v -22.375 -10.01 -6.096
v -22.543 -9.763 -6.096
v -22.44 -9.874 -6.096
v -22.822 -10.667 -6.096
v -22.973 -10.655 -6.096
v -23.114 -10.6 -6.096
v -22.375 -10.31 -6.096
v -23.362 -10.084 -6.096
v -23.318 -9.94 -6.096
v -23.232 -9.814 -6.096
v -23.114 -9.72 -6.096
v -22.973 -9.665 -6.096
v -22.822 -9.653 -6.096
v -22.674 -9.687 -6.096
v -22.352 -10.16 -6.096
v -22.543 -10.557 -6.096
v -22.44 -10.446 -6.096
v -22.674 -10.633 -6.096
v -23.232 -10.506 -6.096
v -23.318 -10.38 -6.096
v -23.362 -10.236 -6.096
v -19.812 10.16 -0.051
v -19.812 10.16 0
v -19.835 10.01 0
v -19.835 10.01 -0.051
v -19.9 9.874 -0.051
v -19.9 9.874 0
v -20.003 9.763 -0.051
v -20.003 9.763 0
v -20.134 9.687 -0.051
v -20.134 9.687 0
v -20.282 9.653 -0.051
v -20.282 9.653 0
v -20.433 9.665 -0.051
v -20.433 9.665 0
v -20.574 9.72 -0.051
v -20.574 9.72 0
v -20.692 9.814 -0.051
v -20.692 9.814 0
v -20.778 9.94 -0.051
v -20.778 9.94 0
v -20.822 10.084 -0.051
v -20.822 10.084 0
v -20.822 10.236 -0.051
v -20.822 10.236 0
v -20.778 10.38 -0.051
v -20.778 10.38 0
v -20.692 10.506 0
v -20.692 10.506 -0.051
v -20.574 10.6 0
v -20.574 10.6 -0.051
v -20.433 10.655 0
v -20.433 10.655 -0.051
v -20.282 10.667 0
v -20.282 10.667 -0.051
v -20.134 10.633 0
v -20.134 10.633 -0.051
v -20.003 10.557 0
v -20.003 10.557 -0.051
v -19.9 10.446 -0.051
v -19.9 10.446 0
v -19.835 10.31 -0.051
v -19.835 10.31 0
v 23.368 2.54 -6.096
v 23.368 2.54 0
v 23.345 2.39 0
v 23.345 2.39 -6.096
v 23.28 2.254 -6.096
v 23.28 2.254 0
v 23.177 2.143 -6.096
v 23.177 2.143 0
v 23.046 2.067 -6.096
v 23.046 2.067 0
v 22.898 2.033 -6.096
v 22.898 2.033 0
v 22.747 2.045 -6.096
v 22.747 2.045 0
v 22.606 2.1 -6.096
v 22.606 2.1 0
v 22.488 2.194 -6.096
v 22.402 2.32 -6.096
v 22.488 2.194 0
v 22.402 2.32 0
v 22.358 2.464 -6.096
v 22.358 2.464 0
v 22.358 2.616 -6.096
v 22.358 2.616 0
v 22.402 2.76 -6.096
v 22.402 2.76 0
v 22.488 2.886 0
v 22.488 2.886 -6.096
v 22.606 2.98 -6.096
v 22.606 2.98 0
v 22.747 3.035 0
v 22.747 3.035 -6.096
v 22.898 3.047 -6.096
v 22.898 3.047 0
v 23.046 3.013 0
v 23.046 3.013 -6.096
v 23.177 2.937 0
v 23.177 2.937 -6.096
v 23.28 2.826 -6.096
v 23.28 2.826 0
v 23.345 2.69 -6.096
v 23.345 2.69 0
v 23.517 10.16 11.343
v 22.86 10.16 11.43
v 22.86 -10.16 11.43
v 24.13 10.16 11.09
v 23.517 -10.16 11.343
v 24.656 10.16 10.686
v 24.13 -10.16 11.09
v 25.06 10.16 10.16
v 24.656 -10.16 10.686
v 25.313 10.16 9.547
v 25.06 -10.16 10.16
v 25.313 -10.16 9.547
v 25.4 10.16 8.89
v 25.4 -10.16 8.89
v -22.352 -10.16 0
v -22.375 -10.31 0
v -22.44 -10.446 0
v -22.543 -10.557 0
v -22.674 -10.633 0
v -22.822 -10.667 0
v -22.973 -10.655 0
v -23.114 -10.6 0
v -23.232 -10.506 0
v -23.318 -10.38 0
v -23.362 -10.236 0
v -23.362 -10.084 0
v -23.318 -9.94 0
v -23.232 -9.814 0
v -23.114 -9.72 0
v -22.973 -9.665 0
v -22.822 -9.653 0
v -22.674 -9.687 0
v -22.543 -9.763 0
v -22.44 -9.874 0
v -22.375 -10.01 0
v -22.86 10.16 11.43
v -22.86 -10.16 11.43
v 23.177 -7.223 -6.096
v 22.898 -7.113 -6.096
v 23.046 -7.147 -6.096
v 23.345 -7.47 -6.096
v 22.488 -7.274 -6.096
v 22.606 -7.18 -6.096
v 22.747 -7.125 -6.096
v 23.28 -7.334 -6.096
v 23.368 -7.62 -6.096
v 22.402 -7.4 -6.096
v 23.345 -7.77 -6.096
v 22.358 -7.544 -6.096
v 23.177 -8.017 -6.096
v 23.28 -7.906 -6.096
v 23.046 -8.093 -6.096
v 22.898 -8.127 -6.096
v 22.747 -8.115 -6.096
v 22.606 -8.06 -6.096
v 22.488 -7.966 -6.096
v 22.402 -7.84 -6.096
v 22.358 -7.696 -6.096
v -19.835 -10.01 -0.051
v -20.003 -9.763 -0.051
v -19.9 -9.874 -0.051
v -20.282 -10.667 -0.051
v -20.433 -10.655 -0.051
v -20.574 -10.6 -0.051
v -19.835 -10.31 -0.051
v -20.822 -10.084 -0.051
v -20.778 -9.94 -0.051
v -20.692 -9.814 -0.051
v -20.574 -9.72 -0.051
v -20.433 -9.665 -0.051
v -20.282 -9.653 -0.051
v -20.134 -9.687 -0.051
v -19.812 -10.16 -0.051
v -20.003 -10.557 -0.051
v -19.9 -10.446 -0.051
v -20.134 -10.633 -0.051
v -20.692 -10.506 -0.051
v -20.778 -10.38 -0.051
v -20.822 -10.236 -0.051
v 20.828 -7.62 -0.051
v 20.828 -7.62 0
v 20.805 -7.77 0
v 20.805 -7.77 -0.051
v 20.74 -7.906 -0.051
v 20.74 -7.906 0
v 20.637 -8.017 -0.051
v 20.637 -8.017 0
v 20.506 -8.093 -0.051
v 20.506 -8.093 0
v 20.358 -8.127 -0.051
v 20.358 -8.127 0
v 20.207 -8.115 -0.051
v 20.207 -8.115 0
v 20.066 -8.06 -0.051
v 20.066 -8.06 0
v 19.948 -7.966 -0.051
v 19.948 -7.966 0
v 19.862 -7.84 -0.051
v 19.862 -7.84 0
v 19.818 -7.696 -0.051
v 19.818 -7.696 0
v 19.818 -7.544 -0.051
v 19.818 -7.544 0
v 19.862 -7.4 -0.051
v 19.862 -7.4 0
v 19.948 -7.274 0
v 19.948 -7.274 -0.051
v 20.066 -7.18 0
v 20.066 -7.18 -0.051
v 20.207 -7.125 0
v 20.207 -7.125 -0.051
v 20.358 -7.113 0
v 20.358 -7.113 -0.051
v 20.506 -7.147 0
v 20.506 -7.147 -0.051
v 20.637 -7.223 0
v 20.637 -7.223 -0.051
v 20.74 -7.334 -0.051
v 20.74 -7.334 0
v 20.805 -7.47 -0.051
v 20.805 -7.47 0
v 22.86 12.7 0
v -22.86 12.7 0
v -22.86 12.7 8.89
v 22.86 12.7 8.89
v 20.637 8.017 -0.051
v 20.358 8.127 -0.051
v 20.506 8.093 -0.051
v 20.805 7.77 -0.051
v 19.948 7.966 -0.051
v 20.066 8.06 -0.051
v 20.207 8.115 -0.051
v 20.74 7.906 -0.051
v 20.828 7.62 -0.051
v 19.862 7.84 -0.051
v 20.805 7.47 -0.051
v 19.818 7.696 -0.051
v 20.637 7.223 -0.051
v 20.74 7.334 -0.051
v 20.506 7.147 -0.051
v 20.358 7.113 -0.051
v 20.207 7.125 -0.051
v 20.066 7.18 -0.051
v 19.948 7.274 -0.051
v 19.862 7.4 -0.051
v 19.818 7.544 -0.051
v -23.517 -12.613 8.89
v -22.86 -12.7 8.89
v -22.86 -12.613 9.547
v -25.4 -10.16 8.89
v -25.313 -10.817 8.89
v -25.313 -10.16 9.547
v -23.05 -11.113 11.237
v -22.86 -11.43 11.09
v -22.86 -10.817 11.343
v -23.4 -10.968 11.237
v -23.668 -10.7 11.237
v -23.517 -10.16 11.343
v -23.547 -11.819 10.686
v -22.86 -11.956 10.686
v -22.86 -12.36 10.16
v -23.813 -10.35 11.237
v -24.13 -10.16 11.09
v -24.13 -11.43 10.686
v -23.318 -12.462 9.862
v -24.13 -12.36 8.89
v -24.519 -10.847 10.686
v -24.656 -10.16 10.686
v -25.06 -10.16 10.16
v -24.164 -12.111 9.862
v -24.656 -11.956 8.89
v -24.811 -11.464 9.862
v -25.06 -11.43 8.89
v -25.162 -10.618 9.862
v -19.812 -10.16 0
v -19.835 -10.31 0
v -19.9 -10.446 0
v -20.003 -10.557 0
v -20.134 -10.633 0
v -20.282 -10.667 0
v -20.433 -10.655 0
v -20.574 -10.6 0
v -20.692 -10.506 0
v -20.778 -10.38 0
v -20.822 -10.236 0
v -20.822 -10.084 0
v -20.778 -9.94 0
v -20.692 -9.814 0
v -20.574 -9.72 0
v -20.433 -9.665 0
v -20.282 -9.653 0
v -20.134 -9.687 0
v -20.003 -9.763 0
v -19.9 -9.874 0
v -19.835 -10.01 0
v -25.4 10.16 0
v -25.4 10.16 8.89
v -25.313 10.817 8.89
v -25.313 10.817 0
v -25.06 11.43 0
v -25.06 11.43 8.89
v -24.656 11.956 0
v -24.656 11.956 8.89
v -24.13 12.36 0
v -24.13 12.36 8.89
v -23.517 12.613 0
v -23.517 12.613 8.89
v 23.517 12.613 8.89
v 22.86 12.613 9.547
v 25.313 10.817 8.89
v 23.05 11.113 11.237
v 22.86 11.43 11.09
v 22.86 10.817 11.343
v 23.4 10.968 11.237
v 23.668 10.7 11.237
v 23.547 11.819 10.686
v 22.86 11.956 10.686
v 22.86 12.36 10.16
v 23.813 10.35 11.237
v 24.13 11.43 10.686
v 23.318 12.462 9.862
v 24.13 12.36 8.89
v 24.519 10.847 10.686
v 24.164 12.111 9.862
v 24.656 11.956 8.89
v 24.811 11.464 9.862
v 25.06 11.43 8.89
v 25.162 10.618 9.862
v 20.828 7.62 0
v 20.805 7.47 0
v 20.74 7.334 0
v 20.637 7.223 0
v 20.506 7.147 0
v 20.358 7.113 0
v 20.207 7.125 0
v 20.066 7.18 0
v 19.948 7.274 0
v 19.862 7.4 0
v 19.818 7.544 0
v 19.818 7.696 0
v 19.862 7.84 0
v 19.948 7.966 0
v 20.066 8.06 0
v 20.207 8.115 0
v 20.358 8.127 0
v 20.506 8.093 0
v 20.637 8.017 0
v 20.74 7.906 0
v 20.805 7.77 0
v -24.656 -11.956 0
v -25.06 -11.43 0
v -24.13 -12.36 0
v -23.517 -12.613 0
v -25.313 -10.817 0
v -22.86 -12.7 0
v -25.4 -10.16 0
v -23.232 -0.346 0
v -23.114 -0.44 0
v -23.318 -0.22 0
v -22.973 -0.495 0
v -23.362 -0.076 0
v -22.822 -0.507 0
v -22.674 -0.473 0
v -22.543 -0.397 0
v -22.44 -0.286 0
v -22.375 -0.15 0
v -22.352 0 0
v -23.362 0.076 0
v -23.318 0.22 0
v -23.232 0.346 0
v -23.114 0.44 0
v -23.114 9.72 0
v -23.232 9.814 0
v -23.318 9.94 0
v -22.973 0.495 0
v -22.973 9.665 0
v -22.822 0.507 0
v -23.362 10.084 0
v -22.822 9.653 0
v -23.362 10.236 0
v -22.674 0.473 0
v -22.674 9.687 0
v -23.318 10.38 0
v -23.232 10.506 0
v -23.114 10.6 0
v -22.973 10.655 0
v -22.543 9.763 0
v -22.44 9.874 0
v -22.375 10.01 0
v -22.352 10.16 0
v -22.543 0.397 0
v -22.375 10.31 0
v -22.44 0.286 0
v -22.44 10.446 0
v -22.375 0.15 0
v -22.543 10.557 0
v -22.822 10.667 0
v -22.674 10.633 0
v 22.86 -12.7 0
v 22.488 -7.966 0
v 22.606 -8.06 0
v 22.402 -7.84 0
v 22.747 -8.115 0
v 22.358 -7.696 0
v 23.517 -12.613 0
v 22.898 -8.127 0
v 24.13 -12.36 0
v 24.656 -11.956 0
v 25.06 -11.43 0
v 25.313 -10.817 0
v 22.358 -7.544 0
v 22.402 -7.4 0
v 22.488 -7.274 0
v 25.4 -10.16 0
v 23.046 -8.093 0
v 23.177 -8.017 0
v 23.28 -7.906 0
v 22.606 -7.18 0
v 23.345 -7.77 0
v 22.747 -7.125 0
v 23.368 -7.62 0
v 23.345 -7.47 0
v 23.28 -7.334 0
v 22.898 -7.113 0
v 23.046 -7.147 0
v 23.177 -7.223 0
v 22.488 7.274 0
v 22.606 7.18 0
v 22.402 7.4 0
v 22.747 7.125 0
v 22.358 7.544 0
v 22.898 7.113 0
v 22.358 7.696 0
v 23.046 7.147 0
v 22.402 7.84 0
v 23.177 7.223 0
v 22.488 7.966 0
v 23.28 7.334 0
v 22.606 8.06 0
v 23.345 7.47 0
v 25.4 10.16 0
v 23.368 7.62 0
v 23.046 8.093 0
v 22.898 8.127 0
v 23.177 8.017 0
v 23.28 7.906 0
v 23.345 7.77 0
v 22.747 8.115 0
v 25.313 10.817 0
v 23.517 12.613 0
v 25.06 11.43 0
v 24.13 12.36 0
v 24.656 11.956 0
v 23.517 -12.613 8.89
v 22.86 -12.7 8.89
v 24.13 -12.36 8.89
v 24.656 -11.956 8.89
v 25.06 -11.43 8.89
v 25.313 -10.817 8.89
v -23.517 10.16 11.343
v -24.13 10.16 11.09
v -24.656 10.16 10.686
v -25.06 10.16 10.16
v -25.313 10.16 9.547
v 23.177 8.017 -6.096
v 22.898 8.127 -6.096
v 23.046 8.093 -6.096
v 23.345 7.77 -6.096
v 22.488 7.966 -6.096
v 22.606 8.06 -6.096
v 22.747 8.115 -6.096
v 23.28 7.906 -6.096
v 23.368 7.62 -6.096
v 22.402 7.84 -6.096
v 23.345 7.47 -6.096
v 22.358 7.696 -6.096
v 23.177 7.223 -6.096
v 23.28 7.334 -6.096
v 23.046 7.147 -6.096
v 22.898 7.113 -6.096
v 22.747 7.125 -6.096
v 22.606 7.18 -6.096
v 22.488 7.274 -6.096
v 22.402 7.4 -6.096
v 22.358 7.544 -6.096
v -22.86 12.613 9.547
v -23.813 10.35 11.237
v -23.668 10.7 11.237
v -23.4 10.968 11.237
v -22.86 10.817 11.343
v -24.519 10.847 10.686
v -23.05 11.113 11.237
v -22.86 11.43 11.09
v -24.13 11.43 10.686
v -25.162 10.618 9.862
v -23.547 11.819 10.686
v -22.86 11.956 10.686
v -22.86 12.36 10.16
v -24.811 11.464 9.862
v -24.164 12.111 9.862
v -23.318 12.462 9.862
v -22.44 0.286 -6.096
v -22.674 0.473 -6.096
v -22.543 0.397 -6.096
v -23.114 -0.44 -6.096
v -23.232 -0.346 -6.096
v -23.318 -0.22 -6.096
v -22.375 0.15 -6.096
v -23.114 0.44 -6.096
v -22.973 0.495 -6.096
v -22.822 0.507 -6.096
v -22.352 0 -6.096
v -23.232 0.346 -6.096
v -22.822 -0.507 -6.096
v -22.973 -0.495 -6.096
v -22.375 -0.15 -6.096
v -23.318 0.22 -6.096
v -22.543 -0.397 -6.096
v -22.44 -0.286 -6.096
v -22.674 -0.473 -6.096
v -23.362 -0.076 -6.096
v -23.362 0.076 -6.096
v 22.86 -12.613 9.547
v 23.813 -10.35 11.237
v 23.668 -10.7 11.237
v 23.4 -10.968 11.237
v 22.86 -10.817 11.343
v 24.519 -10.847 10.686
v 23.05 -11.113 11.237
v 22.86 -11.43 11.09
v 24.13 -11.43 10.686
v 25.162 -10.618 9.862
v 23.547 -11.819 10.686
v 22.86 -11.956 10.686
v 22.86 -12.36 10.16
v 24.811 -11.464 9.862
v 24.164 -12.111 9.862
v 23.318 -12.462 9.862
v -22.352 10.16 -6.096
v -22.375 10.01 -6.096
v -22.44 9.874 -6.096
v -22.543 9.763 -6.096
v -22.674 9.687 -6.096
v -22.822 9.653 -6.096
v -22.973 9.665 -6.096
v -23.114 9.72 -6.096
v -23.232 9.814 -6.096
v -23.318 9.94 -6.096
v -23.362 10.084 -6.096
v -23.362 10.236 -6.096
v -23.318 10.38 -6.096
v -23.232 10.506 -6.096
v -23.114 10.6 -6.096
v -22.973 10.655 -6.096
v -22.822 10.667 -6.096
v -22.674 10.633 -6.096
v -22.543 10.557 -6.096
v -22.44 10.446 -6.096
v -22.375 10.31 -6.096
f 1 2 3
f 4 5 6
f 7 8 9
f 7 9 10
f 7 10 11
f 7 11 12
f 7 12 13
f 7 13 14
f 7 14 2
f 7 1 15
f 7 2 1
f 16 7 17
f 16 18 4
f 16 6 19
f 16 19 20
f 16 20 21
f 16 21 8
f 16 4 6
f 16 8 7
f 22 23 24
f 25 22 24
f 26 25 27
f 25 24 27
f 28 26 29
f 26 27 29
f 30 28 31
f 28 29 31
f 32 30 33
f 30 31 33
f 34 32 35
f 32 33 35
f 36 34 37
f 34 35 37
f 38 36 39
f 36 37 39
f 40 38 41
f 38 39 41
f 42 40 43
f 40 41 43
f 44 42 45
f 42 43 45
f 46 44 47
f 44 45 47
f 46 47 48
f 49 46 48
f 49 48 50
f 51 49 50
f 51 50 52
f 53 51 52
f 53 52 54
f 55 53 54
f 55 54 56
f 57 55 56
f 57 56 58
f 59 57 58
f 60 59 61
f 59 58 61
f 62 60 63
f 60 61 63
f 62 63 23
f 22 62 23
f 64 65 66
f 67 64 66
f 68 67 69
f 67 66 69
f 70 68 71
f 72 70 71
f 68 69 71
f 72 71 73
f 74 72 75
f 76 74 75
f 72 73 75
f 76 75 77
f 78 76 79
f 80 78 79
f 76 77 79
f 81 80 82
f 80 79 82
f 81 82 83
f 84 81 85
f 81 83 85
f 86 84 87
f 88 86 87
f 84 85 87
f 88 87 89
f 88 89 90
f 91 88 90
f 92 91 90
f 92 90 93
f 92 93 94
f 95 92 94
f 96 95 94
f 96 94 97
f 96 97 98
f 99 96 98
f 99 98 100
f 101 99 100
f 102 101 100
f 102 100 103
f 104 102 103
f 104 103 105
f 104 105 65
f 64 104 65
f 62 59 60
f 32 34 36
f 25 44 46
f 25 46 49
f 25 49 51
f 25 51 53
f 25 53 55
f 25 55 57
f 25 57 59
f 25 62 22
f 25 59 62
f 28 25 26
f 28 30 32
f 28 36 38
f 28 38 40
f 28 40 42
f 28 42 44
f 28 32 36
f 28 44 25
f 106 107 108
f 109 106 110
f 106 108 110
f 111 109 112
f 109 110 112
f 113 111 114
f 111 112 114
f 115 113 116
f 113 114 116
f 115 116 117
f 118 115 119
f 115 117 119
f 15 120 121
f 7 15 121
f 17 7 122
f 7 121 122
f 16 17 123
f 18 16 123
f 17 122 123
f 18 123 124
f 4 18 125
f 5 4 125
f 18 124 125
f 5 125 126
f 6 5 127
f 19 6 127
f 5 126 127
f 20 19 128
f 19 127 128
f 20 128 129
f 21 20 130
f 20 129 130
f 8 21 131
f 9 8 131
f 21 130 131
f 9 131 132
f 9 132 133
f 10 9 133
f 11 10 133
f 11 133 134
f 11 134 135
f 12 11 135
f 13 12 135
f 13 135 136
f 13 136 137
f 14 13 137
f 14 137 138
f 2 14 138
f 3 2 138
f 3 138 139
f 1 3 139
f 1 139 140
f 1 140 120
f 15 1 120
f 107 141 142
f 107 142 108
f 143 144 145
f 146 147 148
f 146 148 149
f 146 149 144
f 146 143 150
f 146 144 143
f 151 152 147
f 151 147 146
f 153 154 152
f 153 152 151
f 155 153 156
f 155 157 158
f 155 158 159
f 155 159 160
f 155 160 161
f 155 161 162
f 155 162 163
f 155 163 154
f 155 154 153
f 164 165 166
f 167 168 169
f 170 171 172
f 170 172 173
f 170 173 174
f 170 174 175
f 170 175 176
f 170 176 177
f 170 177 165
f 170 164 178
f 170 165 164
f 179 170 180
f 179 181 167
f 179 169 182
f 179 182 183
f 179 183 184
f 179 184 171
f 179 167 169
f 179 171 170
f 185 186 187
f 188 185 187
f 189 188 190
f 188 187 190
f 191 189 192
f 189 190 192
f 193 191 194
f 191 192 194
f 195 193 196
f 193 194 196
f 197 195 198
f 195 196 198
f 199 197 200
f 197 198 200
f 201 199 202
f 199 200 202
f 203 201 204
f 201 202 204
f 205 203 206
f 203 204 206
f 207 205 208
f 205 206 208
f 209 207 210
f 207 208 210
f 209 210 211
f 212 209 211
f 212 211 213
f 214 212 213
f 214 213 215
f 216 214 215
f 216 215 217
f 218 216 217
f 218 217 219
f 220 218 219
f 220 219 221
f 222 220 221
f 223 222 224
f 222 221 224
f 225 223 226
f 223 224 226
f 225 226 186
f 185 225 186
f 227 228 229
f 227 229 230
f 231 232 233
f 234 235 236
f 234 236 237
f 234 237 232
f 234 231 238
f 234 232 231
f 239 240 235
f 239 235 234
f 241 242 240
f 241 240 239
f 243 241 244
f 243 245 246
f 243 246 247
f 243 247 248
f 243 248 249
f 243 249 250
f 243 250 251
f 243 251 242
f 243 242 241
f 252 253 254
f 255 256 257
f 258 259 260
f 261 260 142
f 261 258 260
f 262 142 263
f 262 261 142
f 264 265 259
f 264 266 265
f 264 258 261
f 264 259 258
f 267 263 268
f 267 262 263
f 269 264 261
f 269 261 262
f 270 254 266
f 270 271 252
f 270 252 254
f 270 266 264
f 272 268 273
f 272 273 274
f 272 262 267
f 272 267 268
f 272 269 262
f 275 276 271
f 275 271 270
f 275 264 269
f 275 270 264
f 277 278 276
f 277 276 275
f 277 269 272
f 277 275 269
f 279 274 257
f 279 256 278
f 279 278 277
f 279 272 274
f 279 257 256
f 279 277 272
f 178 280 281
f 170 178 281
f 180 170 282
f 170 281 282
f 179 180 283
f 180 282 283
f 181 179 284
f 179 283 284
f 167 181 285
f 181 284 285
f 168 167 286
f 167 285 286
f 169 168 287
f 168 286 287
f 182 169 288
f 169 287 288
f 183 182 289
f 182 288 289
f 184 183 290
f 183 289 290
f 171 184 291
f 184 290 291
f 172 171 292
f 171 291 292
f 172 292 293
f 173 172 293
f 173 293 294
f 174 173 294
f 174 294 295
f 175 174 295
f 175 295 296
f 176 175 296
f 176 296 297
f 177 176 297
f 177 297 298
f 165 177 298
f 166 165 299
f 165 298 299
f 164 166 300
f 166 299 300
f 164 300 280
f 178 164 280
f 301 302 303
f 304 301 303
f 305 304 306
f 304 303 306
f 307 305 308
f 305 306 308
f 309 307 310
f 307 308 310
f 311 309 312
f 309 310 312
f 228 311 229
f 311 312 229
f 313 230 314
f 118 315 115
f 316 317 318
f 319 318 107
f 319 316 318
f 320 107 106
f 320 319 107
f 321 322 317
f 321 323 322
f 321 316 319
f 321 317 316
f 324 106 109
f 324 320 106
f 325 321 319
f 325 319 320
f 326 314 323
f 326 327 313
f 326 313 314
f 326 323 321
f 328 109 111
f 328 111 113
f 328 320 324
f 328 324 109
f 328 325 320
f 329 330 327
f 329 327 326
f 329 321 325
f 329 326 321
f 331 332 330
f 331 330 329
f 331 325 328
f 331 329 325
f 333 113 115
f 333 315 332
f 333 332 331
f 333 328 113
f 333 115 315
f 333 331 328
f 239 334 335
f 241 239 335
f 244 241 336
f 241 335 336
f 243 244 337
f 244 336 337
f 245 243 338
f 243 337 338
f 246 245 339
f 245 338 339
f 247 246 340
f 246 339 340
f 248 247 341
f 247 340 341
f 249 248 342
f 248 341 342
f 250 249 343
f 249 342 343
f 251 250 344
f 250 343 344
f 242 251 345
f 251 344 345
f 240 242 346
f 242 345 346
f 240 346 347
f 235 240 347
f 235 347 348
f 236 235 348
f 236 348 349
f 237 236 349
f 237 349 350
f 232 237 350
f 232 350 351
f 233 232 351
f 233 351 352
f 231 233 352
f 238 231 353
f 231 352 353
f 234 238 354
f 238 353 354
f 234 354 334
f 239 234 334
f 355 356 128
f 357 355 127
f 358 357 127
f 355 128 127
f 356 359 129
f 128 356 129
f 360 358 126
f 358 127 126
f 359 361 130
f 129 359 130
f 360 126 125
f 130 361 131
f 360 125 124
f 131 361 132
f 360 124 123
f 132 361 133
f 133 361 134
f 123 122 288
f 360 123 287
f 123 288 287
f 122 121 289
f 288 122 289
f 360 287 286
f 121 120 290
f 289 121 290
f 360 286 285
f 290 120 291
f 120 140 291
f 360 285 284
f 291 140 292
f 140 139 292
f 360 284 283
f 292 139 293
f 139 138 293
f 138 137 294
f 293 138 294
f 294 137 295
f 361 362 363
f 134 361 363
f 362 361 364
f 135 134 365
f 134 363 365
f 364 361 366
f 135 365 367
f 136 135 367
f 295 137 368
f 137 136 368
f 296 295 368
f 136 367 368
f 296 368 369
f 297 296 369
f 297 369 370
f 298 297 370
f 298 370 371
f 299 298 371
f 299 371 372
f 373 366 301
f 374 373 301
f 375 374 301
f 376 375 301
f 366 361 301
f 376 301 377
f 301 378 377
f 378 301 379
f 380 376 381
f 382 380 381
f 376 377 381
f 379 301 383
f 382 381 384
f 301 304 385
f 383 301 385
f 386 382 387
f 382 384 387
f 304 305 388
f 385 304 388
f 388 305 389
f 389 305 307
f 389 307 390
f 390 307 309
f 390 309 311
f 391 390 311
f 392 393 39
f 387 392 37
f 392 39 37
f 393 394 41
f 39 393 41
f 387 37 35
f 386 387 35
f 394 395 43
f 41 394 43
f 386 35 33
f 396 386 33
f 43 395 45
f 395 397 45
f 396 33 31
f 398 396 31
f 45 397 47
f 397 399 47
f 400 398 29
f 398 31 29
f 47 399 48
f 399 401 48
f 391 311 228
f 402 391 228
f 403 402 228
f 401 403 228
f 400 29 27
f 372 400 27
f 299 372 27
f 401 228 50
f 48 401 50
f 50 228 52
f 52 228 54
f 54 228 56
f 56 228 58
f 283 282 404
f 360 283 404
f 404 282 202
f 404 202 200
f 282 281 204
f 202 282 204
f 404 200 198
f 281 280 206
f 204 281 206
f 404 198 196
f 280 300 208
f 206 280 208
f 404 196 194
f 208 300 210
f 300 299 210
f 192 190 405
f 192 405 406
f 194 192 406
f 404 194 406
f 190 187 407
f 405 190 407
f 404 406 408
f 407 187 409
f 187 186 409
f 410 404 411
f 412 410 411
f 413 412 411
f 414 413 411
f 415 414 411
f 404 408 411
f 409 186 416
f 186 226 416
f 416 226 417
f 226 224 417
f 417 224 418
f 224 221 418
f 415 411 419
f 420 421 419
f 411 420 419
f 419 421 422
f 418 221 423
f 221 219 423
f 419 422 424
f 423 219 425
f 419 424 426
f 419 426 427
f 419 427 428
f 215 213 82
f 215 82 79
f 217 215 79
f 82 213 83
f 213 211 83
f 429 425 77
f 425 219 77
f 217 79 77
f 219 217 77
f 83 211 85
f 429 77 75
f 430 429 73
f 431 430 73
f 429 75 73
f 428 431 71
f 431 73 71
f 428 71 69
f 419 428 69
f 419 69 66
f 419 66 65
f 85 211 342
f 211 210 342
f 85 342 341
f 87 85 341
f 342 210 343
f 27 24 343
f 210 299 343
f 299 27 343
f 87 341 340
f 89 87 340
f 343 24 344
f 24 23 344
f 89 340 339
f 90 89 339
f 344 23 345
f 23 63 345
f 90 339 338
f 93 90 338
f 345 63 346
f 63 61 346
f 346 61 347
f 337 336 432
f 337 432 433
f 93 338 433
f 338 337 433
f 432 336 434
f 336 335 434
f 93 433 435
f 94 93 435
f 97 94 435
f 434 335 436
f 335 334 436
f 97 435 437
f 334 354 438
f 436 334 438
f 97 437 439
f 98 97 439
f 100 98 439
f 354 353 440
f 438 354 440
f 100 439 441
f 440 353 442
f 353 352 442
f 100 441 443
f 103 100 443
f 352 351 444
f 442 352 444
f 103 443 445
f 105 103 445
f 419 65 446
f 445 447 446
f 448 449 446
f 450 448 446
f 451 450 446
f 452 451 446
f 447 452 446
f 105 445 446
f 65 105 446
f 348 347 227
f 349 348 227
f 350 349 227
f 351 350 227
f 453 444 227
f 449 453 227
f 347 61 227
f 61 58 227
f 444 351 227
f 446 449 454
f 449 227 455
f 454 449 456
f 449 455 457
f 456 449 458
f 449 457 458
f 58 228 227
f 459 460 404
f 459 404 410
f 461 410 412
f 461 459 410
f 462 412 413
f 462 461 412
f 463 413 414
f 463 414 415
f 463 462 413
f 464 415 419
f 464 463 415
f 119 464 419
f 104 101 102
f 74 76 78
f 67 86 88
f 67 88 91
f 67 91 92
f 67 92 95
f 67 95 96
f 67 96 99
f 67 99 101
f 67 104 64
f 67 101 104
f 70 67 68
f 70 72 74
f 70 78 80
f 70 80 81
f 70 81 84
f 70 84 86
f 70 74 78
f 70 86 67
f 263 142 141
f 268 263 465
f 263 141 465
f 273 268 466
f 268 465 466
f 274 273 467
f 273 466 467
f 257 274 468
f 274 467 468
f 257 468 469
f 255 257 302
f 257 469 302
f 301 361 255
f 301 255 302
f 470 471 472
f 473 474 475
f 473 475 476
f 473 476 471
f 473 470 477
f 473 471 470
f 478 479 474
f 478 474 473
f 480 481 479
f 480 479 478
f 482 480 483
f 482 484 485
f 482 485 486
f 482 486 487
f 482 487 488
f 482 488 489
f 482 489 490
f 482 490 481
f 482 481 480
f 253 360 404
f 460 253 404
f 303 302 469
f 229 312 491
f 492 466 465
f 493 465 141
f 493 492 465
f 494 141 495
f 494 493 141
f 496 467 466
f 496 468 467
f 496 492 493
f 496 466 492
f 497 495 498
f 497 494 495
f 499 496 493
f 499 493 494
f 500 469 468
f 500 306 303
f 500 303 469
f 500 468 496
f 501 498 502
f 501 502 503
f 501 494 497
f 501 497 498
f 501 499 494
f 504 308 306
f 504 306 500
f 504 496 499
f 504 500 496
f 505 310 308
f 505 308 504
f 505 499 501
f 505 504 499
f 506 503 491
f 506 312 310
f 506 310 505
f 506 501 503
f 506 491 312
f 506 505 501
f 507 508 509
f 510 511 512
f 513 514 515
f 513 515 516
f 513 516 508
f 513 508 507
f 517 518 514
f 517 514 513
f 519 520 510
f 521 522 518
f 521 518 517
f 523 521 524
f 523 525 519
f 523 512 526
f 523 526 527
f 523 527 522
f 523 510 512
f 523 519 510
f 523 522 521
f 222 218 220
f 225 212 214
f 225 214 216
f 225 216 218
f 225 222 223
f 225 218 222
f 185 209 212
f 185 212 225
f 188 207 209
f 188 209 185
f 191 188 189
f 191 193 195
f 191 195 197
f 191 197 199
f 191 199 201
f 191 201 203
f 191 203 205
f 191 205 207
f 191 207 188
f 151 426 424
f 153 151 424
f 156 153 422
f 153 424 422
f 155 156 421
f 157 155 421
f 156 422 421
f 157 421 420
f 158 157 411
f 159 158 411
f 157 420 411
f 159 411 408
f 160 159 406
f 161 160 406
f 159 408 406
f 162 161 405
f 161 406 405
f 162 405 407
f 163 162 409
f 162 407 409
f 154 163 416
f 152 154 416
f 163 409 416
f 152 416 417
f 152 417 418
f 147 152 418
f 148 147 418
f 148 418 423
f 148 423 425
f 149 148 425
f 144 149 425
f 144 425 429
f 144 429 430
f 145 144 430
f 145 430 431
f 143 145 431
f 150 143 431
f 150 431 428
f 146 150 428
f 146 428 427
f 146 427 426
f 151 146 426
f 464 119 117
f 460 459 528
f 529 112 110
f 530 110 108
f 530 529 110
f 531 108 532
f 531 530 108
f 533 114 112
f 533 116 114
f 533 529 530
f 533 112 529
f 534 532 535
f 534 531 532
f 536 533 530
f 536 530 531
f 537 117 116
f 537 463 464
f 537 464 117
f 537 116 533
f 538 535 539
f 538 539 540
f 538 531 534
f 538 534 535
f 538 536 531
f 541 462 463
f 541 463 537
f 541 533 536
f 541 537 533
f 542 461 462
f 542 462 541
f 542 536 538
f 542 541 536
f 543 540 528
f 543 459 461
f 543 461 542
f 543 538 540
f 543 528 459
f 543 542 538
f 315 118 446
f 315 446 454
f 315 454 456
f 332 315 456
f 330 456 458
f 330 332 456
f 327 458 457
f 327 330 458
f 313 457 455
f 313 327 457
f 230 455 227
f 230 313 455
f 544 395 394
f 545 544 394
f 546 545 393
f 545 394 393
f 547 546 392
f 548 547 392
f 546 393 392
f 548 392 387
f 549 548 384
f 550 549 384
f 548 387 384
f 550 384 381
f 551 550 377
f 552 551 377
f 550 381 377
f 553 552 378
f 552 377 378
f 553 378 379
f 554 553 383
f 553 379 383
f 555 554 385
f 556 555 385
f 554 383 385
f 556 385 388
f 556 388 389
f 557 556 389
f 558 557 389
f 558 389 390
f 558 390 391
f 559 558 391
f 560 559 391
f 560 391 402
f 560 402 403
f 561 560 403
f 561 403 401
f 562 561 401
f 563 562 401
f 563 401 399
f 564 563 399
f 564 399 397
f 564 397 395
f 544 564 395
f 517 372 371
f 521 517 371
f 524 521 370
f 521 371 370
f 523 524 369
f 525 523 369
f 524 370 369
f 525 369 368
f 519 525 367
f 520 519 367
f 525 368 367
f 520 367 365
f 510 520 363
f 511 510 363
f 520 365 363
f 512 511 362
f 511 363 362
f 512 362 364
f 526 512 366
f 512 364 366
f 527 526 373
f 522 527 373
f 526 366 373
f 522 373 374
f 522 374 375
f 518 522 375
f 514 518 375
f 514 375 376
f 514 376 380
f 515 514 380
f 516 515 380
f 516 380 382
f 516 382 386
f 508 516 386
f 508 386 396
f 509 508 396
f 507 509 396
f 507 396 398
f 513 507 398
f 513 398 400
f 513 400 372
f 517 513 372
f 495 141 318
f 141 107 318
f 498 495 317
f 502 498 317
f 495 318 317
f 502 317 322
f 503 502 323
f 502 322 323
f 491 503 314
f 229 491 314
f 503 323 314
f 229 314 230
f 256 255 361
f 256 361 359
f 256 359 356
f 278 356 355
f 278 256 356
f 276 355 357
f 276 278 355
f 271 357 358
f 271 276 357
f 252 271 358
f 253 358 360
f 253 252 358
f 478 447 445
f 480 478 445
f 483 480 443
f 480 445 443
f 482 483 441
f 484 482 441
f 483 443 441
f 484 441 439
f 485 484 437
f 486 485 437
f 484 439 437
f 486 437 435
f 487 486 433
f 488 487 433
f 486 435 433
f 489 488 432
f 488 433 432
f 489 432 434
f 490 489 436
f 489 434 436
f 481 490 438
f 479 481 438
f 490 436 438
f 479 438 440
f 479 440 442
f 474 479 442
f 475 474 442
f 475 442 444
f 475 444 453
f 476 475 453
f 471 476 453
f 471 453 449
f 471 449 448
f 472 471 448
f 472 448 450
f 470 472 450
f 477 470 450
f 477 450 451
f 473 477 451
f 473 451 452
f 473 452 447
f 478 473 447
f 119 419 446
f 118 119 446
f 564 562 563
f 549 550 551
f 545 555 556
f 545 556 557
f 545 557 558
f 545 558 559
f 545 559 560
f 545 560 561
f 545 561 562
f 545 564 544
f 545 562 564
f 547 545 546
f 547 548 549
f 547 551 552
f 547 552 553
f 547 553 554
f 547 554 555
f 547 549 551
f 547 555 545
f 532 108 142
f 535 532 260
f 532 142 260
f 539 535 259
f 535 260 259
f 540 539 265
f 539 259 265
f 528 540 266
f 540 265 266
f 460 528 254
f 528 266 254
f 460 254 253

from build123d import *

# Parameters (mm, degrees)
F0_W     = 50.8
F0_H     = 25.4
F1_DEPTH = 11.43
F2_R     = 2.54
F3_R     = 2.54
F4_R     = 0.508
F5_DEPTH = 6.096
F6_DEPTH = 0.0508


with BuildPart() as f1:
    # F0 (on Top) → F1 (new body)
    with BuildSketch(Plane.XY):
        Rectangle(F0_W, F0_H)
    extrude(amount=F1_DEPTH)

    # F2
    f2_edges = [f1.edges().sort_by_distance(p)[0] for p in [
        (25.4, -12.7, 5.715),
        (-25.4, -12.7, 5.715),
        (25.4, 12.7, 5.715),
        (-25.4, 12.7, 5.715),
    ]]
    fillet(f2_edges, radius=F2_R)

    # F3
    f3_edges = [f1.edges().sort_by_distance(p)[0] for p in [
        (0, 12.7, 11.43),
    ]]
    fillet(f3_edges, radius=F3_R)

    # F4 (on face) → F5 (join)
    with BuildSketch(Plane(origin=(0, 0, 0), x_dir=(1, 0, 0), z_dir=(0, 0, -1))):
        with Locations((22.86, 7.62)):
            Circle(F4_R)
        with Locations((22.86, -2.54)):
            Circle(F4_R)
        with Locations((22.86, -7.62)):
            Circle(F4_R)
        with Locations((-22.86, -10.16)):
            Circle(F4_R)
        with Locations((-22.86, 0)):
            Circle(F4_R)
        with Locations((-22.86, 10.16)):
            Circle(F4_R)
    extrude(amount=F5_DEPTH)

    # F4 (on face) → F6 (join)
    with BuildSketch(Plane(origin=(0, 0, 0), x_dir=(1, 0, 0), z_dir=(0, 0, -1))):
        with Locations((-22.86, -10.16)):
            Circle(F4_R)
        with Locations((-22.86, 0)):
            Circle(F4_R)
        with Locations((-22.86, 10.16)):
            Circle(F4_R)
        with Locations((22.86, 7.62)):
            Circle(F4_R)
        with Locations((22.86, -2.54)):
            Circle(F4_R)
        with Locations((22.86, -7.62)):
            Circle(F4_R)
        with Locations((-20.32, -10.16)):
            Circle(F4_R)
        with Locations((-20.32, 10.16)):
            Circle(F4_R)
        with Locations((20.32, -7.62)):
            Circle(F4_R)
        with Locations((20.32, 7.62)):
            Circle(F4_R)
    extrude(amount=F6_DEPTH)


solid = f1.part
